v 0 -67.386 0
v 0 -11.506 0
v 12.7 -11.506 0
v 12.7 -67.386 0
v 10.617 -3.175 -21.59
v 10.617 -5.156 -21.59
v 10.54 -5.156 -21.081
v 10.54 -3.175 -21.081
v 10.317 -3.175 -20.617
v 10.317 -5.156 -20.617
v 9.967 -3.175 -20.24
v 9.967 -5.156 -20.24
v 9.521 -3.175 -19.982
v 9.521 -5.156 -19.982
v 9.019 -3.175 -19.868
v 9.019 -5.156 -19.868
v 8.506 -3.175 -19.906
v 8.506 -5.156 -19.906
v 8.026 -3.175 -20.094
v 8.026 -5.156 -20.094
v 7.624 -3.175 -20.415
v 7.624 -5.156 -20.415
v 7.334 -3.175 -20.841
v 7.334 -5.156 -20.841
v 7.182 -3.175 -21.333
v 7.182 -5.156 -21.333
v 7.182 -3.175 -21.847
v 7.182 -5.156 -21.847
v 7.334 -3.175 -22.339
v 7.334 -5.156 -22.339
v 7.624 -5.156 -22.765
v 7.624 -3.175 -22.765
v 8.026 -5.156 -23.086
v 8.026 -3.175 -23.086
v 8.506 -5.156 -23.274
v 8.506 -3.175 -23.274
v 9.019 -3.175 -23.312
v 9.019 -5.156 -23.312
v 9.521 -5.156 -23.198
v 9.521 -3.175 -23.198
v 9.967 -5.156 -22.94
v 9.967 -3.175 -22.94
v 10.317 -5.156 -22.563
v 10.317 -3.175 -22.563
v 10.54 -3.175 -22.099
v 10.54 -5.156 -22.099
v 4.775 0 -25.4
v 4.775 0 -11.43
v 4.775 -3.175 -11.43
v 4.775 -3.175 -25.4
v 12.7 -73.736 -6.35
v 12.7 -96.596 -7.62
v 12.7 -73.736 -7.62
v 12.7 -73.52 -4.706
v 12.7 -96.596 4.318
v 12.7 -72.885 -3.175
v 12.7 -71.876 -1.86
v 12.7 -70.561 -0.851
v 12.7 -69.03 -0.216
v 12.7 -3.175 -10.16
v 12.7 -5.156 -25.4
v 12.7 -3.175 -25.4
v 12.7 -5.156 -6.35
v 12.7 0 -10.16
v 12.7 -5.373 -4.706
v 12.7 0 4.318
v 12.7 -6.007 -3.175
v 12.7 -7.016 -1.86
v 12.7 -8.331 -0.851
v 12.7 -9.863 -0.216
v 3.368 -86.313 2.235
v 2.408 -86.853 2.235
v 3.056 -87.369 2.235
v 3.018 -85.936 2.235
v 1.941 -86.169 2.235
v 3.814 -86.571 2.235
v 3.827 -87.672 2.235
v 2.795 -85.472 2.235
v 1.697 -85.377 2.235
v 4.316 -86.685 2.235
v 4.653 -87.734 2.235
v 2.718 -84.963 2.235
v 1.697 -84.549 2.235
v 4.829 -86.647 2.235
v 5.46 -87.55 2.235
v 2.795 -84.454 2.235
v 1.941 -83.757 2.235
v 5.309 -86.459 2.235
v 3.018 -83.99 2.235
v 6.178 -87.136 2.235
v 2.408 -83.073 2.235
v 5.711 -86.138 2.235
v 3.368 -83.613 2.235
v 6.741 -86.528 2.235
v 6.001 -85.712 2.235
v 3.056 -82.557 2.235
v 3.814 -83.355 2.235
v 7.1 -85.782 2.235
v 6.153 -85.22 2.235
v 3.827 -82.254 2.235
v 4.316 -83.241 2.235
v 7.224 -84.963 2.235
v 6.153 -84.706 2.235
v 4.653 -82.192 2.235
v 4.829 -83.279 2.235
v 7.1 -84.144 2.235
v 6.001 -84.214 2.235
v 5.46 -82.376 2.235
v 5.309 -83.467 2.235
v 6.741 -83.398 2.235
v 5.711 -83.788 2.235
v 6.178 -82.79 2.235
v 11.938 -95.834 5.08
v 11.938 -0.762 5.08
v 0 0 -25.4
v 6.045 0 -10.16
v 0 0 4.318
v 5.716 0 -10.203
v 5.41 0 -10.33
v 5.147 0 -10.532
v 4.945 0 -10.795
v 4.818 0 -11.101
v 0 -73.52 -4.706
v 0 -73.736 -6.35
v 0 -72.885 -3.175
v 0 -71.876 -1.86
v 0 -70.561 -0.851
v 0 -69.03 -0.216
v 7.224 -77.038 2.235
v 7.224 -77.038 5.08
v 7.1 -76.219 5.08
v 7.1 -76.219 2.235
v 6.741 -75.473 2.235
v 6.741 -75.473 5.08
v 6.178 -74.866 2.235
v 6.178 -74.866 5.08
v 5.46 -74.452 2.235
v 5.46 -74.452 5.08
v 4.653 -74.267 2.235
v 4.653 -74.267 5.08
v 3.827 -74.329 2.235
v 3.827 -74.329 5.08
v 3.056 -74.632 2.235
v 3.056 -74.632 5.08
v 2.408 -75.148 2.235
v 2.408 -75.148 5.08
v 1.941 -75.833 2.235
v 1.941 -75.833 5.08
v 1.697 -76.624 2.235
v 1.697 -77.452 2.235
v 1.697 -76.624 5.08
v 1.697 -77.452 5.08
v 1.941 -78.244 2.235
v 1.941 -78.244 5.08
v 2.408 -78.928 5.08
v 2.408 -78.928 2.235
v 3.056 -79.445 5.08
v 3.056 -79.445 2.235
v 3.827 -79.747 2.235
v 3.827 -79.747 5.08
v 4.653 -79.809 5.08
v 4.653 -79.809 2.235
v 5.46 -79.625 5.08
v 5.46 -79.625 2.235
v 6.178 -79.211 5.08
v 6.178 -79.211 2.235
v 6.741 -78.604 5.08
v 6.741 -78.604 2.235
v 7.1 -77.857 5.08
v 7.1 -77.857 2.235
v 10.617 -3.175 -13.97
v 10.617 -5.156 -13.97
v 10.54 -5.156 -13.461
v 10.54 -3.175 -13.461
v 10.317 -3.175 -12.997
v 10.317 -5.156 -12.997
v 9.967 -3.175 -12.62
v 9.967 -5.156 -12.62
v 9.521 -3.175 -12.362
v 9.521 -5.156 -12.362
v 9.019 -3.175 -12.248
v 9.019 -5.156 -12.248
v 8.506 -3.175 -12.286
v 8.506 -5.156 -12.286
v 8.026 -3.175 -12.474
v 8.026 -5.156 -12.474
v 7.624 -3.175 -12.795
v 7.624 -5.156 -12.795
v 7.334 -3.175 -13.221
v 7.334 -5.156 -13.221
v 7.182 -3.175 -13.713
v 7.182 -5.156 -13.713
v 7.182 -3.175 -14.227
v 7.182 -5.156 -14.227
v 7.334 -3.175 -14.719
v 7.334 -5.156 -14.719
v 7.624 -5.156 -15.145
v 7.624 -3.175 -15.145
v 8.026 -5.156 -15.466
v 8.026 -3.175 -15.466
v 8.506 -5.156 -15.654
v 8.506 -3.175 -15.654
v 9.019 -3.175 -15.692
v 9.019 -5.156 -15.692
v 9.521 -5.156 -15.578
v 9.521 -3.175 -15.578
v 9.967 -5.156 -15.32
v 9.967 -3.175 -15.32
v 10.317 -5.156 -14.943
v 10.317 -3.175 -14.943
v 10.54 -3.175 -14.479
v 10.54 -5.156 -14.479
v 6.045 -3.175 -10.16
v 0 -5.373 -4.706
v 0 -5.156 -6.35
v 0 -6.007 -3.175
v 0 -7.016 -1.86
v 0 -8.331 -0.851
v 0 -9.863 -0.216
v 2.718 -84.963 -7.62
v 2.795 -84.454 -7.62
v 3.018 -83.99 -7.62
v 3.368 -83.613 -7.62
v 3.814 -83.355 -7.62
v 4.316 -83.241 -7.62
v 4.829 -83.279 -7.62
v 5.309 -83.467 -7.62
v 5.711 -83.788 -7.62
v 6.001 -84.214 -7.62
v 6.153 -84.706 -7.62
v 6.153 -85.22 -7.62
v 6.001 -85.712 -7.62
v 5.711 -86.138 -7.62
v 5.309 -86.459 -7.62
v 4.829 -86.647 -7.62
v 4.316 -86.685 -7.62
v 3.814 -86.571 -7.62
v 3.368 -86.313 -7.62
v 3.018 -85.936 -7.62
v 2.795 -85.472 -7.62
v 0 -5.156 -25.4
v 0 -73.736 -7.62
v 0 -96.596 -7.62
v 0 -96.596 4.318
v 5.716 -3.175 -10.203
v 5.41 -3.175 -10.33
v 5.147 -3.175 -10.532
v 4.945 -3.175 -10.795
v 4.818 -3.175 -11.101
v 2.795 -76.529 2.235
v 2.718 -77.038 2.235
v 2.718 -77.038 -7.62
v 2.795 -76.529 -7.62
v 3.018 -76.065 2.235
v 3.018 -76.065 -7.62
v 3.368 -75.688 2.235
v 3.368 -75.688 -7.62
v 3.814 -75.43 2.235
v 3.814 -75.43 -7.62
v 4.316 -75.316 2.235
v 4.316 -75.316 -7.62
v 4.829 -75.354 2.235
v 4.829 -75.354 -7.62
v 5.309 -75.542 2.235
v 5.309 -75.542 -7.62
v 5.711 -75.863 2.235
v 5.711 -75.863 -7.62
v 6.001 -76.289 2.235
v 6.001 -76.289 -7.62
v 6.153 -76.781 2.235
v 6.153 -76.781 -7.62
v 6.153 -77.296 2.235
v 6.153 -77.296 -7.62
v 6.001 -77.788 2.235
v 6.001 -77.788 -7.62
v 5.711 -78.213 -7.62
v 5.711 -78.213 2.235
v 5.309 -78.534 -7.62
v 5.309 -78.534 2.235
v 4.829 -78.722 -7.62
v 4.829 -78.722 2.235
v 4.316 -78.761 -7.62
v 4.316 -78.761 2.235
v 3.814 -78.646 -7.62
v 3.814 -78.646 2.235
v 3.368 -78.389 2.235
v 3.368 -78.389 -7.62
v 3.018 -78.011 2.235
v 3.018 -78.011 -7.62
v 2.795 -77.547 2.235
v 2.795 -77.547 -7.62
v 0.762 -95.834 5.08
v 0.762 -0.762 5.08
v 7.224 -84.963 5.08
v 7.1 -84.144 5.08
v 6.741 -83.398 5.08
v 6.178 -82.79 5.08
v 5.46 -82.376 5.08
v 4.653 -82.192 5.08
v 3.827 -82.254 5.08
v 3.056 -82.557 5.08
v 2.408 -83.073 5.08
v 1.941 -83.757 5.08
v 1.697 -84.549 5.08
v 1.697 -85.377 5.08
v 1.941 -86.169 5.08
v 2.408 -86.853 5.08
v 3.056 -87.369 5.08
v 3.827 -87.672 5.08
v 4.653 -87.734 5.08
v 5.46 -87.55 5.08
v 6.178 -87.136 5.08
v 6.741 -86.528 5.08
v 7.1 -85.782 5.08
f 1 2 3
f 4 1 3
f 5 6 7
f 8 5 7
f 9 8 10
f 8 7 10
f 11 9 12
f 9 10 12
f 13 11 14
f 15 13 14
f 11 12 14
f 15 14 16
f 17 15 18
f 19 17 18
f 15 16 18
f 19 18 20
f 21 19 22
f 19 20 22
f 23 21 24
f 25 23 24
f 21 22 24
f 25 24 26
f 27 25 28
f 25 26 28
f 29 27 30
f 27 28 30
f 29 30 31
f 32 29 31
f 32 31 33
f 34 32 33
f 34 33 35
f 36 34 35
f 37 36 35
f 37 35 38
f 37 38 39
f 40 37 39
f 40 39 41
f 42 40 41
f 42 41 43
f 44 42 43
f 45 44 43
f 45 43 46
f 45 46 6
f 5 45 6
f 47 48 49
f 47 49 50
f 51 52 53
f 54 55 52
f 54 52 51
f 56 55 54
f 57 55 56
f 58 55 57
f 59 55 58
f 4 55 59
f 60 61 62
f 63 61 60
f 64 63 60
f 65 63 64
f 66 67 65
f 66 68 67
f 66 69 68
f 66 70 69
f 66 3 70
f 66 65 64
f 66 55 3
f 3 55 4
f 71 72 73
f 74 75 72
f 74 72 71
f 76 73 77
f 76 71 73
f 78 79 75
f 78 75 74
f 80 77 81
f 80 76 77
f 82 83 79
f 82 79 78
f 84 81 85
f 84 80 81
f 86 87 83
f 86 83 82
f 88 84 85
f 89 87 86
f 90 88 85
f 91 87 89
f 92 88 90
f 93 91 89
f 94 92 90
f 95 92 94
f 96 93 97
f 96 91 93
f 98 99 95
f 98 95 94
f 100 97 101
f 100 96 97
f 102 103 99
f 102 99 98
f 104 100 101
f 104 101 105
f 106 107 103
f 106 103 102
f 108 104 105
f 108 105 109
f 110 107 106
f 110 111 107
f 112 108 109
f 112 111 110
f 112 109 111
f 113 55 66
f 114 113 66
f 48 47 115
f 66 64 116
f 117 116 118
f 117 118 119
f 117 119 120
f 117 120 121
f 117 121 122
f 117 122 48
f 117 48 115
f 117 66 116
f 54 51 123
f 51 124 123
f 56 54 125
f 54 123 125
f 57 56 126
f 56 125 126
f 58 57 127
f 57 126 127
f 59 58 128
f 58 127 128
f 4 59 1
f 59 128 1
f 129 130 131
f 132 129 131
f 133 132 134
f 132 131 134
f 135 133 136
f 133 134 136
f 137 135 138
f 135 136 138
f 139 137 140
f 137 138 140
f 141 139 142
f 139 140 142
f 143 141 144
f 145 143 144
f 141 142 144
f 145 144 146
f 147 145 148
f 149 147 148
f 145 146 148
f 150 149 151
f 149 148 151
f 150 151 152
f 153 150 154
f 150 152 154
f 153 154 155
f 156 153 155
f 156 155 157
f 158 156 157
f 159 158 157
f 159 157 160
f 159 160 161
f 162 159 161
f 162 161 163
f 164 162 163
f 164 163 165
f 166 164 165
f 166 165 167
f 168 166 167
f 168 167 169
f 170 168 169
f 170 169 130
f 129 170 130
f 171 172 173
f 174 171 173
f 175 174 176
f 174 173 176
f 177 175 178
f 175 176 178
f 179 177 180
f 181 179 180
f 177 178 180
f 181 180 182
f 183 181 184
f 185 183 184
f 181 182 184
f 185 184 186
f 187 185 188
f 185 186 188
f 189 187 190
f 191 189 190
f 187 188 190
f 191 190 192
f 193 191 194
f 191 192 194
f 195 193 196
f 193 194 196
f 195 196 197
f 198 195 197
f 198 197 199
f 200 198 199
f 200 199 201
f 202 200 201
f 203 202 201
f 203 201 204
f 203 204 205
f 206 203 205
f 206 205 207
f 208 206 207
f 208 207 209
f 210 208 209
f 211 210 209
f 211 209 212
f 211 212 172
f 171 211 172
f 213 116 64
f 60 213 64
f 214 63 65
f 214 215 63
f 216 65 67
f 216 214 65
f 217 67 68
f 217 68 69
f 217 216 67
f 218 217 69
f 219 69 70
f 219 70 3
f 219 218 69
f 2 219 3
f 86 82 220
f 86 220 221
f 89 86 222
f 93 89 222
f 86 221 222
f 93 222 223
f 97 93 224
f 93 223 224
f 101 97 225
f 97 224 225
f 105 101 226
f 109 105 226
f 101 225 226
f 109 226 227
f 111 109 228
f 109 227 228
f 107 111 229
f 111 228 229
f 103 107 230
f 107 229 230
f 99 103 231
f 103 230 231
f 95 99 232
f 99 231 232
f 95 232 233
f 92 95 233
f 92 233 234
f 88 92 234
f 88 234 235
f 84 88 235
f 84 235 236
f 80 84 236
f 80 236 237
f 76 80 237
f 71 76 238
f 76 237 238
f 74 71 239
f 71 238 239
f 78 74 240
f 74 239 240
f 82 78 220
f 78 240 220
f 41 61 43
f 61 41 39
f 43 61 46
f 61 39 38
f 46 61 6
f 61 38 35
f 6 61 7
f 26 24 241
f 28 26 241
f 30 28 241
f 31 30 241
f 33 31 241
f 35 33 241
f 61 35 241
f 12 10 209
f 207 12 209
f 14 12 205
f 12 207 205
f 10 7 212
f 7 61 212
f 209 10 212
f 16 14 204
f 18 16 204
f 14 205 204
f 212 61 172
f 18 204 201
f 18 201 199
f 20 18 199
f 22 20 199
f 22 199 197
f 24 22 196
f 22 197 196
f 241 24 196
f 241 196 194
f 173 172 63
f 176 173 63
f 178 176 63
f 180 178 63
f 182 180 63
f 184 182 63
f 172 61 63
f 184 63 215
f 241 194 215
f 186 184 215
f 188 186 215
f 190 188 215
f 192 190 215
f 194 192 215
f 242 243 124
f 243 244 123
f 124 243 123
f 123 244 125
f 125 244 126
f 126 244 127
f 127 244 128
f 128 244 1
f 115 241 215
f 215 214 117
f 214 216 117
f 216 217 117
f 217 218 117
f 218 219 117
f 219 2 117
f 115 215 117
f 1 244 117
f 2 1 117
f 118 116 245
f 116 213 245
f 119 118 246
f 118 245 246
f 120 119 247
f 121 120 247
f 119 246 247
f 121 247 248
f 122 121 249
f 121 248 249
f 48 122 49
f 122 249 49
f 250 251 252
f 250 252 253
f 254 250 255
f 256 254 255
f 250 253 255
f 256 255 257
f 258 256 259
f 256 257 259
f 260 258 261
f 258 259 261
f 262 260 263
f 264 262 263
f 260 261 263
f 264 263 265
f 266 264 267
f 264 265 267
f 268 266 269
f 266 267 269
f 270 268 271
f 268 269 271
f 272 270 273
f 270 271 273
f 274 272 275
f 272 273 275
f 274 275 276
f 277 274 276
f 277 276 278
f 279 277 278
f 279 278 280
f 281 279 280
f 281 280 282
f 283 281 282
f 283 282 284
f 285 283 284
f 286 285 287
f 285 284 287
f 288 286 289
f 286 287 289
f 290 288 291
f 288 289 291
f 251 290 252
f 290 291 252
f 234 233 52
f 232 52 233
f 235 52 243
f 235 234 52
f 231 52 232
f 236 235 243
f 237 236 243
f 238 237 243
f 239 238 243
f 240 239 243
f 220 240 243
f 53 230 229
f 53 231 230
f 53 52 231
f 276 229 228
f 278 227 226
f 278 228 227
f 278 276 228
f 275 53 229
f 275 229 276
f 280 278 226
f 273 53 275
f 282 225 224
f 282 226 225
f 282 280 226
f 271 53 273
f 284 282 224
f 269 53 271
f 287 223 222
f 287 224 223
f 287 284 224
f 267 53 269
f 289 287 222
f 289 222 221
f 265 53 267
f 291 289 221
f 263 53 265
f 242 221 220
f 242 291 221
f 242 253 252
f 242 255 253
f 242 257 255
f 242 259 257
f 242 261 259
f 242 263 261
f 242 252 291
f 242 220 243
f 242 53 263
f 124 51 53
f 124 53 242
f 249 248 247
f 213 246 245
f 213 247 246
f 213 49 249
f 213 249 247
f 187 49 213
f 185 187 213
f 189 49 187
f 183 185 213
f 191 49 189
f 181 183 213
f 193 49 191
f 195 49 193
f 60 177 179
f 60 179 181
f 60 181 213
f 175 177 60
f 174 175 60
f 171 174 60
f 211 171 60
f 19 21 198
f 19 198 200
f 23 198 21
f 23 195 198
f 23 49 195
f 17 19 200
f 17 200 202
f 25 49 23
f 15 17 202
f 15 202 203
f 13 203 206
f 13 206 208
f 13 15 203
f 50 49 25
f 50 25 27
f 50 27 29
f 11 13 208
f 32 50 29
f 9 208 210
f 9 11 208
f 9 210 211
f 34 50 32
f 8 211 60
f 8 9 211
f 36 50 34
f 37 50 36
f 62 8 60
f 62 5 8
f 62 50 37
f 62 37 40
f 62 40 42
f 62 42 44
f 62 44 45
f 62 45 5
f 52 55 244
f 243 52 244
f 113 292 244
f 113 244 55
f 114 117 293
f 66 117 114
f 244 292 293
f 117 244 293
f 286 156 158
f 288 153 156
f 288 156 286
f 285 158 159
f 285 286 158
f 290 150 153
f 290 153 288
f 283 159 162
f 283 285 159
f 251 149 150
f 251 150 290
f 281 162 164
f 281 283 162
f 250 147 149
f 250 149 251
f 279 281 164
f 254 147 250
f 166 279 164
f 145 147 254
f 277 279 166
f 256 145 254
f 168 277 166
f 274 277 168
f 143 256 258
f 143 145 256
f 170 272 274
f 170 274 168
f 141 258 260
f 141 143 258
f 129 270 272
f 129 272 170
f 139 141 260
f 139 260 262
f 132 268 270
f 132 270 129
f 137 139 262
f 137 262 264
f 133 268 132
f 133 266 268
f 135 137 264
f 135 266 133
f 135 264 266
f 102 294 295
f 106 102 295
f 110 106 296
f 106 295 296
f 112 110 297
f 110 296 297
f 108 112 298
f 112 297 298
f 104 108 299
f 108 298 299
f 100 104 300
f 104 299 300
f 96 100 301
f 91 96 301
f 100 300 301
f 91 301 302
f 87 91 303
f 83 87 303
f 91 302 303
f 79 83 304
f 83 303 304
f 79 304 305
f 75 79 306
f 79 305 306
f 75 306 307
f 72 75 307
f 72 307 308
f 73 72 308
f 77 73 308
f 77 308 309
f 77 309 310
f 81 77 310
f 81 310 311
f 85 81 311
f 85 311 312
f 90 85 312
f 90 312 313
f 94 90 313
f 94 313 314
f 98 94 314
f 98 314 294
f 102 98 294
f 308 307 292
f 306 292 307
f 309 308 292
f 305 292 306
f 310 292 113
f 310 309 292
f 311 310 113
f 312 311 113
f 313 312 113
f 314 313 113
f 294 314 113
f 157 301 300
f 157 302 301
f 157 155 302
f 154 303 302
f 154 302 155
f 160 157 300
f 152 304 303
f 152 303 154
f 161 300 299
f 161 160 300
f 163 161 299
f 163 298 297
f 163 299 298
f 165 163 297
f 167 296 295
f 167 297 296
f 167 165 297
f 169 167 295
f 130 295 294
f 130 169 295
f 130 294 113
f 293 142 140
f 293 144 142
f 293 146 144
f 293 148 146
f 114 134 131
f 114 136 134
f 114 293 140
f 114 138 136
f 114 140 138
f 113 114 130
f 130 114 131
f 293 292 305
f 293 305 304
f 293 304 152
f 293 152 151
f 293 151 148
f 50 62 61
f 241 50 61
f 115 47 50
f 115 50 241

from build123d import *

# Parameters (mm, degrees)
SKETCH1_W                                      = 12.7
SKETCH1_H                                      = 96.5962
EXTRUDE1_DEPTH                                 = 5.08
SKETCH2_W                                      = 12.7
SKETCH2_H                                      = 5.1562
EXTRUDE2_DEPTH                                 = 25.4
SKETCH6_W                                      = 12.7
SKETCH6_H                                      = 22.86
EXTRUDE4_DEPTH                                 = 7.62
F_4_CLEARANCE_HOLE1_D                          = 3.4544
SKETCH7_W                                      = 7.9248
SKETCH7_H                                      = 15.24
EXTRUDE5_DEPTH                                 = 3.175
FILLET1_R                                      = 1.27
FILLET2_R                                      = 6.35
CHAMFER1_SIZE                                  = 0.762
CBORE_FOR_4_SOCKET_HEAD_CAP_SCREW1_D           = 3.4544
CBORE_FOR_4_SOCKET_HEAD_CAP_SCREW1_CBORE_D     = 5.55752
CBORE_FOR_4_SOCKET_HEAD_CAP_SCREW1_CBORE_DEPTH = 2.8448


with BuildPart() as part:
    # Sketch1 → Extrude1 (new body)
    with BuildSketch(Plane.XY):
        with Locations((6.35, -48.2981)):
            Rectangle(SKETCH1_W, SKETCH1_H)
    extrude(amount=EXTRUDE1_DEPTH)

    # Sketch2 → Extrude2 (add)
    with BuildSketch(Plane(origin=(0, 0, 0), x_dir=(-1, 0, 0), z_dir=(0, 0, -1))):
        with Locations((-6.35, -2.5781)):
            Rectangle(SKETCH2_W, SKETCH2_H)
    extrude(amount=EXTRUDE2_DEPTH)

    # Sketch6 → Extrude4 (add)
    with BuildSketch(Plane(origin=(0, 0, 0), x_dir=(-1, 0, 0), z_dir=(0, 0, -1))):
        with Locations((-6.35, -85.1662)):
            Rectangle(SKETCH6_W, SKETCH6_H)
    extrude(amount=EXTRUDE4_DEPTH)

    # #4 Clearance Hole1 (through all)
    with Locations(Plane(origin=(0, 0, 0), x_dir=(-1, 0, 0), z_dir=(0, 1, 0))):
        with Locations((-8.89, -21.59), (-8.89, -13.97)):
            Hole(F_4_CLEARANCE_HOLE1_D / 2)

    # Sketch7 → Extrude5 (cut)
    with BuildSketch(Plane(origin=(0, 0, 0), x_dir=(1, 0, 0), z_dir=(0, 1, 0))):
        with Locations((8.7376, 17.78)):
            Rectangle(SKETCH7_W, SKETCH7_H)
    extrude(amount=-EXTRUDE5_DEPTH, mode=Mode.SUBTRACT)

    # Fillet1
    fillet1_edges = [part.edges().sort_by_distance(p)[0] for p in [
        (4.7752, -1.5875, -10.16),
    ]]
    fillet(fillet1_edges, radius=FILLET1_R)

    # Fillet2
    fillet2_edges = [part.edges().sort_by_distance(p)[0] for p in [
        (6.35, -73.7362, 0),
        (6.35, -5.1562, 0),
    ]]
    fillet(fillet2_edges, radius=FILLET2_R)

    # Chamfer1
    chamfer1_edges = [part.edges().sort_by_distance(p)[0] for p in [
        (12.7, -48.2981, 5.08),
        (6.35, 0, 5.08),
        (0, -48.2981, 5.08),
        (6.35, -96.5962, 5.08),
    ]]
    chamfer(chamfer1_edges, length=CHAMFER1_SIZE)

    # CBORE for #4 Socket Head Cap Screw1 (through all)
    with Locations(Plane.XY.offset(5.08)):
        with Locations((4.445, -84.963), (4.445, -77.0382)):
            CounterBoreHole(CBORE_FOR_4_SOCKET_HEAD_CAP_SCREW1_D / 2, CBORE_FOR_4_SOCKET_HEAD_CAP_SCREW1_CBORE_D / 2, CBORE_FOR_4_SOCKET_HEAD_CAP_SCREW1_CBORE_DEPTH)


solid = part.part
